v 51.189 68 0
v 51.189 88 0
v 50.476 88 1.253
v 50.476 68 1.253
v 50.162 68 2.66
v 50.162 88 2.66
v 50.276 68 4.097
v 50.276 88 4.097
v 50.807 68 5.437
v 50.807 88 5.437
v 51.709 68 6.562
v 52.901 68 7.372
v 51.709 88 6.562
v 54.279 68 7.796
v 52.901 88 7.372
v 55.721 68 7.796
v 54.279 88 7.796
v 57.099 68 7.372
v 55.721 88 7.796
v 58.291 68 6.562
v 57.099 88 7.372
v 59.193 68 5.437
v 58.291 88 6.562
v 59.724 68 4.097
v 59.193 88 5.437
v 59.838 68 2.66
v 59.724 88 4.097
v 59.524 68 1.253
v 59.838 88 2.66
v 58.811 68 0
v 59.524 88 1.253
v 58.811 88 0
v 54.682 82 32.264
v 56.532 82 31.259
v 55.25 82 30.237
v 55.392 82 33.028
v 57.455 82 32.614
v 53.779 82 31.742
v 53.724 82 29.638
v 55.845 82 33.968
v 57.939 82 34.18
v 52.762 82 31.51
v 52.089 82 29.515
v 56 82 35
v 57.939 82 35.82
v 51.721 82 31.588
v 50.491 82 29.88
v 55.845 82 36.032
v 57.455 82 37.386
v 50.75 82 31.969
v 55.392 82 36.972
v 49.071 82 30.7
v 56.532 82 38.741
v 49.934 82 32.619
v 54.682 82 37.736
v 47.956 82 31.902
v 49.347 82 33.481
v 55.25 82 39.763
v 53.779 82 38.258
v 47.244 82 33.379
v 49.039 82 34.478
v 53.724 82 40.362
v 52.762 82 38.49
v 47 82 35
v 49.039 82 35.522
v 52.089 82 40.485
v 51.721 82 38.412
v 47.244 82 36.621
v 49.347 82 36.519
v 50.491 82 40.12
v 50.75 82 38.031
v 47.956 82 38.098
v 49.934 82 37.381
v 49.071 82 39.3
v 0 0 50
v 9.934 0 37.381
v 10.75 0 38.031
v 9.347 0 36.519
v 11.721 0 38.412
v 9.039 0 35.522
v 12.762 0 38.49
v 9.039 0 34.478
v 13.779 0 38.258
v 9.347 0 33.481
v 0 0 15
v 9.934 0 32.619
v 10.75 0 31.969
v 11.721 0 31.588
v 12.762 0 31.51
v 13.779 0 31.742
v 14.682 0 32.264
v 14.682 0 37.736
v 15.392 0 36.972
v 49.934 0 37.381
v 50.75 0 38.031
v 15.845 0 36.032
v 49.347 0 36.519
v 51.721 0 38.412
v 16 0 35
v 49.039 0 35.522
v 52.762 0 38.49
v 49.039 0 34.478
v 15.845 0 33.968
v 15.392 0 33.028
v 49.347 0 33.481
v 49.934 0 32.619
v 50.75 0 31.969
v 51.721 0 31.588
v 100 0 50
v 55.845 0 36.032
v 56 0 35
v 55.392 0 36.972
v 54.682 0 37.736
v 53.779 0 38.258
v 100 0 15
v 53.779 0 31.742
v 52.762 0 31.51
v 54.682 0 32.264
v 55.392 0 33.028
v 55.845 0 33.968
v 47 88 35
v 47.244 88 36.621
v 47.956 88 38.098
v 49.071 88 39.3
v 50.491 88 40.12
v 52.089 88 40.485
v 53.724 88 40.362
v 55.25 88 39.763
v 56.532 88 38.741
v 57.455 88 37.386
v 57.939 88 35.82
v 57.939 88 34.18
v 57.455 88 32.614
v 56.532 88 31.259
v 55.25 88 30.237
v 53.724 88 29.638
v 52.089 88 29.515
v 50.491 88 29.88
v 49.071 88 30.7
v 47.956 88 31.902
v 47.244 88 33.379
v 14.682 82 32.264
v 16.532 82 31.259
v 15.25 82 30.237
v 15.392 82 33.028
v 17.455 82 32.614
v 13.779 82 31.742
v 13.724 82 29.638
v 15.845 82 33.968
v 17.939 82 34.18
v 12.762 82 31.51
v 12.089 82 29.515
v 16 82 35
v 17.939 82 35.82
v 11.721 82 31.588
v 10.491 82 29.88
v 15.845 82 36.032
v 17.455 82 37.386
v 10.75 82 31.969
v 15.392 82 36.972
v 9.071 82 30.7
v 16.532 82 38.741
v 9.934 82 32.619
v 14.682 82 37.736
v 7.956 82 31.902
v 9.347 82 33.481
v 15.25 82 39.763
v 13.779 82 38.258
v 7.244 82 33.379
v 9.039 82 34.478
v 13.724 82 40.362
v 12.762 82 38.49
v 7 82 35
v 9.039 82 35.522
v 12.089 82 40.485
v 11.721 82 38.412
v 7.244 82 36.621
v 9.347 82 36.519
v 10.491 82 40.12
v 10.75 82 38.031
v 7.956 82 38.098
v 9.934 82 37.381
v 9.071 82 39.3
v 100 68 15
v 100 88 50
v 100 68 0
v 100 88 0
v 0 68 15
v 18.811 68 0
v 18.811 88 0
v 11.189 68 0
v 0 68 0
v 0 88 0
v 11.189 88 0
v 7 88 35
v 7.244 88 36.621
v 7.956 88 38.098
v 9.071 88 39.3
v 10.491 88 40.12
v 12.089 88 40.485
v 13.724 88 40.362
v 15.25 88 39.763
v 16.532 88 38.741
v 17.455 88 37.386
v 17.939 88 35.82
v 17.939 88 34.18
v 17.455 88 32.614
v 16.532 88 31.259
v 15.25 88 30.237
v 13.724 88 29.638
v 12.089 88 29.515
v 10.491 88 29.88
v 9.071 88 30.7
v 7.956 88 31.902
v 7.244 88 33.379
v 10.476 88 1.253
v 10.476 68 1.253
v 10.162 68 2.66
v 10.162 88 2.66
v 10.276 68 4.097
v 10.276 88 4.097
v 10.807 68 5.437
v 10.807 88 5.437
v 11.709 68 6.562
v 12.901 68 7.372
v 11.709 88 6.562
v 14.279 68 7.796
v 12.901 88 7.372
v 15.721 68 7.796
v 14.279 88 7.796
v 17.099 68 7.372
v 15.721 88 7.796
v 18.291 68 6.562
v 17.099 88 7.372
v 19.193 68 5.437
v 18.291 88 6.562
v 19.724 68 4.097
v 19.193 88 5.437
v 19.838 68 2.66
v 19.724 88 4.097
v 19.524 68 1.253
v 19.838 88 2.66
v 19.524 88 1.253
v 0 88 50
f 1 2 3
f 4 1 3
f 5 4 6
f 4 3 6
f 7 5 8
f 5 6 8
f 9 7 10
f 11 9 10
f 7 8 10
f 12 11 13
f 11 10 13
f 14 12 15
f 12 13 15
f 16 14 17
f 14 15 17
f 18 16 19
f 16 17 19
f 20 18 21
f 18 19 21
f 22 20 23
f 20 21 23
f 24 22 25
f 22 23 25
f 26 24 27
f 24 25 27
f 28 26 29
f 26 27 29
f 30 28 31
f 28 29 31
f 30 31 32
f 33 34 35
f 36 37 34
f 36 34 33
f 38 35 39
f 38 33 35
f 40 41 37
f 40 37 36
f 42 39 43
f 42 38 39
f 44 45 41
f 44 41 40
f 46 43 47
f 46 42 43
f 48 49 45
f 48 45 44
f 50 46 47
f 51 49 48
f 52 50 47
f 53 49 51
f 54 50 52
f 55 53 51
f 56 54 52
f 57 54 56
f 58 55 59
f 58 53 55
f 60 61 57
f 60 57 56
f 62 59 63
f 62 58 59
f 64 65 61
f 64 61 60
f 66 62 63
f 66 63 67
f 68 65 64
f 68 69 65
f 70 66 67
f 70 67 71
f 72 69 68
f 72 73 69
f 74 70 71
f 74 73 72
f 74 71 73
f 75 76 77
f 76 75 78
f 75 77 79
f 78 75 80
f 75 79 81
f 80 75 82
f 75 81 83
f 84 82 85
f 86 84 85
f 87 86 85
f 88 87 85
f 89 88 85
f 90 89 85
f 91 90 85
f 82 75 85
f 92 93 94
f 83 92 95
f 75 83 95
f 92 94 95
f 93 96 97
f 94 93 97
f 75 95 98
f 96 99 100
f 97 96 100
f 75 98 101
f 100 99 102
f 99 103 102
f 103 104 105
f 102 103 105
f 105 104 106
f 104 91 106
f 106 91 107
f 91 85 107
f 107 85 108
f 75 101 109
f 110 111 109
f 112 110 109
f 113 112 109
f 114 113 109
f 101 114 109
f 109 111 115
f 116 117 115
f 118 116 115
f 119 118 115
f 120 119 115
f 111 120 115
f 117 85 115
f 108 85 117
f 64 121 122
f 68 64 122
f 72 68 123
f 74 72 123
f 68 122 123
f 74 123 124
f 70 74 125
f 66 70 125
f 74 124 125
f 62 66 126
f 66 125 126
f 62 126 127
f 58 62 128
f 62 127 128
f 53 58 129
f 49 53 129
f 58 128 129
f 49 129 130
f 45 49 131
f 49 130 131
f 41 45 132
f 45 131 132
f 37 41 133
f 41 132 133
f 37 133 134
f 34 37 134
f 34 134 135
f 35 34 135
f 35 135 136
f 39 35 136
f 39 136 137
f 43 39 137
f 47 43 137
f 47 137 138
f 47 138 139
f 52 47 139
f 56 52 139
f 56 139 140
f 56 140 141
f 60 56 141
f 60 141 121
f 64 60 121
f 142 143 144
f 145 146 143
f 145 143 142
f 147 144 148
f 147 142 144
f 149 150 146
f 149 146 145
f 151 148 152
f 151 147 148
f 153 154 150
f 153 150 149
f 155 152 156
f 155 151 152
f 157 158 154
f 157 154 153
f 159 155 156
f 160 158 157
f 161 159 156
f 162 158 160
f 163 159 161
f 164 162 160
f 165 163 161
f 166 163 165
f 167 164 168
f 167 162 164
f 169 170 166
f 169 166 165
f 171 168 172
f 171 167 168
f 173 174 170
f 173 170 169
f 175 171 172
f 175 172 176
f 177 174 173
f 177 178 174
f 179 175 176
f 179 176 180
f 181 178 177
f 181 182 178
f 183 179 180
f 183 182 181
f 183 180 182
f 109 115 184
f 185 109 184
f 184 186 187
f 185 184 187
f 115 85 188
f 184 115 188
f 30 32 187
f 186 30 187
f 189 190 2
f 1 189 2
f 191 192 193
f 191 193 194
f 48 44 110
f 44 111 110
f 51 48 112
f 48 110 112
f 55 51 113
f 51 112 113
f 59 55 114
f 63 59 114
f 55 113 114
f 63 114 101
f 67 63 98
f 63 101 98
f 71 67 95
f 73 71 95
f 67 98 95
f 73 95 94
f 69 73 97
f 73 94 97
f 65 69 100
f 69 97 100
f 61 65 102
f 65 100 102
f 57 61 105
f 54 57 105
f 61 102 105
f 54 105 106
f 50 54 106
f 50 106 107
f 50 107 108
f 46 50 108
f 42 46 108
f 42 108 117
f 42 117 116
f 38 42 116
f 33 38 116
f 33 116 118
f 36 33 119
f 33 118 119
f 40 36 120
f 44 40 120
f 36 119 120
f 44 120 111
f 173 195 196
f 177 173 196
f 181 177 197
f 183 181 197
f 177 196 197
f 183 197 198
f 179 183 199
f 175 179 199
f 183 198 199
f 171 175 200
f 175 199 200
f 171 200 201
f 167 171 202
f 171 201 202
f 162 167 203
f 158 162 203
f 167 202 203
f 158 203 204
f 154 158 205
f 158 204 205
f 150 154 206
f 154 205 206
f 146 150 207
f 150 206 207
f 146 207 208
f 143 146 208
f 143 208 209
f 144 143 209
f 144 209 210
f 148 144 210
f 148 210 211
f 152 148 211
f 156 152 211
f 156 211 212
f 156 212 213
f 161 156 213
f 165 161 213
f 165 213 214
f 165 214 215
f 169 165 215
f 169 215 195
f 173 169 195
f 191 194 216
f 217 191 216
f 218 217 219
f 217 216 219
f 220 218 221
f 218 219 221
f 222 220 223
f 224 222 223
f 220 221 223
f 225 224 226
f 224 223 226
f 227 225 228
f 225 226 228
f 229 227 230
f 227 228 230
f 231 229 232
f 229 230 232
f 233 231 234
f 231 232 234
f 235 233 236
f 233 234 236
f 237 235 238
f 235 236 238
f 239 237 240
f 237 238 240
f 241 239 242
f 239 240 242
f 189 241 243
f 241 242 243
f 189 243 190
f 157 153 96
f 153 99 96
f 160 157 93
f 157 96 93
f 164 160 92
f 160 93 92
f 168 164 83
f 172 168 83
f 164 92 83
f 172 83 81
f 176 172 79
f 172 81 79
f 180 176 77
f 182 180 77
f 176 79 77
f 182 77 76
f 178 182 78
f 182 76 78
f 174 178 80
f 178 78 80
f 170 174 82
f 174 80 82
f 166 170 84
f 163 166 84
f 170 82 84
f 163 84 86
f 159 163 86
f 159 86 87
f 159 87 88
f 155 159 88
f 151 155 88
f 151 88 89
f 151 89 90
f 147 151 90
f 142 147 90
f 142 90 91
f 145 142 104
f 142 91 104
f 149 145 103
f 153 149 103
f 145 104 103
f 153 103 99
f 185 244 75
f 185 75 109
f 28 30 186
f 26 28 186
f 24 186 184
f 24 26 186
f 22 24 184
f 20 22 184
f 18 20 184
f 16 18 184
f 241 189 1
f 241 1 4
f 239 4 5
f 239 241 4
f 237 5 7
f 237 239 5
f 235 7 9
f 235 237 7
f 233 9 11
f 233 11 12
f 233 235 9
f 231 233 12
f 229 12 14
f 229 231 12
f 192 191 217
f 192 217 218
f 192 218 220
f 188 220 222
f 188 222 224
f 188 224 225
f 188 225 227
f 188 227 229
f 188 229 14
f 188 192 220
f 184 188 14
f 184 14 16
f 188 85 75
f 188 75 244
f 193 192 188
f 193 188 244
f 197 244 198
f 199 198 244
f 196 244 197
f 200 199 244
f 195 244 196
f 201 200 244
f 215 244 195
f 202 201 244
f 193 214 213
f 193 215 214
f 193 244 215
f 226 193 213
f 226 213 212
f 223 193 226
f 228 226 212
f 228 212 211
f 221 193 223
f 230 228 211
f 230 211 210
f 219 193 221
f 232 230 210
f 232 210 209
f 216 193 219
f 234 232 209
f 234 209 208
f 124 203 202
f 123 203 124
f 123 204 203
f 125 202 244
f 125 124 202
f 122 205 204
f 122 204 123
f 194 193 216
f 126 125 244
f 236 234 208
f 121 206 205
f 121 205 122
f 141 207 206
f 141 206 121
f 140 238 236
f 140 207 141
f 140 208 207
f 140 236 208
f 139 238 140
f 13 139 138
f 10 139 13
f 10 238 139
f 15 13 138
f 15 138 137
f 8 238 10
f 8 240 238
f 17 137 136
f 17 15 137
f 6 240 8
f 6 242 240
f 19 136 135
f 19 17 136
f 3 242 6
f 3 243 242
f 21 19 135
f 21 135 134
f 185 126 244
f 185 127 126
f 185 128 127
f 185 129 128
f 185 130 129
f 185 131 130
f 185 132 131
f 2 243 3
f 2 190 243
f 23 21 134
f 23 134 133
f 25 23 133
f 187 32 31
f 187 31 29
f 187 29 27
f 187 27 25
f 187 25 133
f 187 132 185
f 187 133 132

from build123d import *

# Parameters (mm, degrees)
SKETCH_1_W                   = 100
SKETCH_1_H                   = 88
EXTRUDE_1_DEPTH              = 50
SKETCH_2_W                   = 15
SKETCH_2_H                   = 68
CUT_EXTRUDE_1_DEPTH          = 143.281411295
SKETCH_4_R                   = 4.85
CUT_EXTRUDE_3_DEPTH          = 143.281411295
HOLE_WIZARD_M6_1_D           = 7
HOLE_WIZARD_M6_1_CBORE_D     = 11
HOLE_WIZARD_M6_1_CBORE_DEPTH = 6


with BuildPart() as part:
    # 草图1 → 凸台-拉伸1 (new body)
    with BuildSketch(Plane.XY):
        with Locations((50, 44)):
            Rectangle(SKETCH_1_W, SKETCH_1_H)
    extrude(amount=EXTRUDE_1_DEPTH)

    # 草图2 → 切除-拉伸1 (cut, through all)
    with BuildSketch(Plane.ZY):
        with Locations((7.5, 34)):
            Rectangle(SKETCH_2_W, SKETCH_2_H)
    extrude(amount=-CUT_EXTRUDE_1_DEPTH, mode=Mode.SUBTRACT)

    # 草图4 → 切除-拉伸3 (cut, through all)
    with BuildSketch(Plane(origin=(0, 88, 0), x_dir=(1, 0, 0), z_dir=(0, 1, 0))):
        with Locations((15, -3)):
            Circle(SKETCH_4_R)
        with Locations((55, -3)):
            Circle(SKETCH_4_R)
    extrude(amount=-CUT_EXTRUDE_3_DEPTH, mode=Mode.SUBTRACT)

    # M6 六角凹头螺钉的柱形沉头孔1 (through all)
    with Locations(Plane(origin=(0, 88, 0), x_dir=(-1, 0, 0), z_dir=(0, 1, 0))):
        with Locations((-12.5, 35), (-52.5, 35)):
            CounterBoreHole(HOLE_WIZARD_M6_1_D / 2, HOLE_WIZARD_M6_1_CBORE_D / 2, HOLE_WIZARD_M6_1_CBORE_DEPTH)


solid = part.part
